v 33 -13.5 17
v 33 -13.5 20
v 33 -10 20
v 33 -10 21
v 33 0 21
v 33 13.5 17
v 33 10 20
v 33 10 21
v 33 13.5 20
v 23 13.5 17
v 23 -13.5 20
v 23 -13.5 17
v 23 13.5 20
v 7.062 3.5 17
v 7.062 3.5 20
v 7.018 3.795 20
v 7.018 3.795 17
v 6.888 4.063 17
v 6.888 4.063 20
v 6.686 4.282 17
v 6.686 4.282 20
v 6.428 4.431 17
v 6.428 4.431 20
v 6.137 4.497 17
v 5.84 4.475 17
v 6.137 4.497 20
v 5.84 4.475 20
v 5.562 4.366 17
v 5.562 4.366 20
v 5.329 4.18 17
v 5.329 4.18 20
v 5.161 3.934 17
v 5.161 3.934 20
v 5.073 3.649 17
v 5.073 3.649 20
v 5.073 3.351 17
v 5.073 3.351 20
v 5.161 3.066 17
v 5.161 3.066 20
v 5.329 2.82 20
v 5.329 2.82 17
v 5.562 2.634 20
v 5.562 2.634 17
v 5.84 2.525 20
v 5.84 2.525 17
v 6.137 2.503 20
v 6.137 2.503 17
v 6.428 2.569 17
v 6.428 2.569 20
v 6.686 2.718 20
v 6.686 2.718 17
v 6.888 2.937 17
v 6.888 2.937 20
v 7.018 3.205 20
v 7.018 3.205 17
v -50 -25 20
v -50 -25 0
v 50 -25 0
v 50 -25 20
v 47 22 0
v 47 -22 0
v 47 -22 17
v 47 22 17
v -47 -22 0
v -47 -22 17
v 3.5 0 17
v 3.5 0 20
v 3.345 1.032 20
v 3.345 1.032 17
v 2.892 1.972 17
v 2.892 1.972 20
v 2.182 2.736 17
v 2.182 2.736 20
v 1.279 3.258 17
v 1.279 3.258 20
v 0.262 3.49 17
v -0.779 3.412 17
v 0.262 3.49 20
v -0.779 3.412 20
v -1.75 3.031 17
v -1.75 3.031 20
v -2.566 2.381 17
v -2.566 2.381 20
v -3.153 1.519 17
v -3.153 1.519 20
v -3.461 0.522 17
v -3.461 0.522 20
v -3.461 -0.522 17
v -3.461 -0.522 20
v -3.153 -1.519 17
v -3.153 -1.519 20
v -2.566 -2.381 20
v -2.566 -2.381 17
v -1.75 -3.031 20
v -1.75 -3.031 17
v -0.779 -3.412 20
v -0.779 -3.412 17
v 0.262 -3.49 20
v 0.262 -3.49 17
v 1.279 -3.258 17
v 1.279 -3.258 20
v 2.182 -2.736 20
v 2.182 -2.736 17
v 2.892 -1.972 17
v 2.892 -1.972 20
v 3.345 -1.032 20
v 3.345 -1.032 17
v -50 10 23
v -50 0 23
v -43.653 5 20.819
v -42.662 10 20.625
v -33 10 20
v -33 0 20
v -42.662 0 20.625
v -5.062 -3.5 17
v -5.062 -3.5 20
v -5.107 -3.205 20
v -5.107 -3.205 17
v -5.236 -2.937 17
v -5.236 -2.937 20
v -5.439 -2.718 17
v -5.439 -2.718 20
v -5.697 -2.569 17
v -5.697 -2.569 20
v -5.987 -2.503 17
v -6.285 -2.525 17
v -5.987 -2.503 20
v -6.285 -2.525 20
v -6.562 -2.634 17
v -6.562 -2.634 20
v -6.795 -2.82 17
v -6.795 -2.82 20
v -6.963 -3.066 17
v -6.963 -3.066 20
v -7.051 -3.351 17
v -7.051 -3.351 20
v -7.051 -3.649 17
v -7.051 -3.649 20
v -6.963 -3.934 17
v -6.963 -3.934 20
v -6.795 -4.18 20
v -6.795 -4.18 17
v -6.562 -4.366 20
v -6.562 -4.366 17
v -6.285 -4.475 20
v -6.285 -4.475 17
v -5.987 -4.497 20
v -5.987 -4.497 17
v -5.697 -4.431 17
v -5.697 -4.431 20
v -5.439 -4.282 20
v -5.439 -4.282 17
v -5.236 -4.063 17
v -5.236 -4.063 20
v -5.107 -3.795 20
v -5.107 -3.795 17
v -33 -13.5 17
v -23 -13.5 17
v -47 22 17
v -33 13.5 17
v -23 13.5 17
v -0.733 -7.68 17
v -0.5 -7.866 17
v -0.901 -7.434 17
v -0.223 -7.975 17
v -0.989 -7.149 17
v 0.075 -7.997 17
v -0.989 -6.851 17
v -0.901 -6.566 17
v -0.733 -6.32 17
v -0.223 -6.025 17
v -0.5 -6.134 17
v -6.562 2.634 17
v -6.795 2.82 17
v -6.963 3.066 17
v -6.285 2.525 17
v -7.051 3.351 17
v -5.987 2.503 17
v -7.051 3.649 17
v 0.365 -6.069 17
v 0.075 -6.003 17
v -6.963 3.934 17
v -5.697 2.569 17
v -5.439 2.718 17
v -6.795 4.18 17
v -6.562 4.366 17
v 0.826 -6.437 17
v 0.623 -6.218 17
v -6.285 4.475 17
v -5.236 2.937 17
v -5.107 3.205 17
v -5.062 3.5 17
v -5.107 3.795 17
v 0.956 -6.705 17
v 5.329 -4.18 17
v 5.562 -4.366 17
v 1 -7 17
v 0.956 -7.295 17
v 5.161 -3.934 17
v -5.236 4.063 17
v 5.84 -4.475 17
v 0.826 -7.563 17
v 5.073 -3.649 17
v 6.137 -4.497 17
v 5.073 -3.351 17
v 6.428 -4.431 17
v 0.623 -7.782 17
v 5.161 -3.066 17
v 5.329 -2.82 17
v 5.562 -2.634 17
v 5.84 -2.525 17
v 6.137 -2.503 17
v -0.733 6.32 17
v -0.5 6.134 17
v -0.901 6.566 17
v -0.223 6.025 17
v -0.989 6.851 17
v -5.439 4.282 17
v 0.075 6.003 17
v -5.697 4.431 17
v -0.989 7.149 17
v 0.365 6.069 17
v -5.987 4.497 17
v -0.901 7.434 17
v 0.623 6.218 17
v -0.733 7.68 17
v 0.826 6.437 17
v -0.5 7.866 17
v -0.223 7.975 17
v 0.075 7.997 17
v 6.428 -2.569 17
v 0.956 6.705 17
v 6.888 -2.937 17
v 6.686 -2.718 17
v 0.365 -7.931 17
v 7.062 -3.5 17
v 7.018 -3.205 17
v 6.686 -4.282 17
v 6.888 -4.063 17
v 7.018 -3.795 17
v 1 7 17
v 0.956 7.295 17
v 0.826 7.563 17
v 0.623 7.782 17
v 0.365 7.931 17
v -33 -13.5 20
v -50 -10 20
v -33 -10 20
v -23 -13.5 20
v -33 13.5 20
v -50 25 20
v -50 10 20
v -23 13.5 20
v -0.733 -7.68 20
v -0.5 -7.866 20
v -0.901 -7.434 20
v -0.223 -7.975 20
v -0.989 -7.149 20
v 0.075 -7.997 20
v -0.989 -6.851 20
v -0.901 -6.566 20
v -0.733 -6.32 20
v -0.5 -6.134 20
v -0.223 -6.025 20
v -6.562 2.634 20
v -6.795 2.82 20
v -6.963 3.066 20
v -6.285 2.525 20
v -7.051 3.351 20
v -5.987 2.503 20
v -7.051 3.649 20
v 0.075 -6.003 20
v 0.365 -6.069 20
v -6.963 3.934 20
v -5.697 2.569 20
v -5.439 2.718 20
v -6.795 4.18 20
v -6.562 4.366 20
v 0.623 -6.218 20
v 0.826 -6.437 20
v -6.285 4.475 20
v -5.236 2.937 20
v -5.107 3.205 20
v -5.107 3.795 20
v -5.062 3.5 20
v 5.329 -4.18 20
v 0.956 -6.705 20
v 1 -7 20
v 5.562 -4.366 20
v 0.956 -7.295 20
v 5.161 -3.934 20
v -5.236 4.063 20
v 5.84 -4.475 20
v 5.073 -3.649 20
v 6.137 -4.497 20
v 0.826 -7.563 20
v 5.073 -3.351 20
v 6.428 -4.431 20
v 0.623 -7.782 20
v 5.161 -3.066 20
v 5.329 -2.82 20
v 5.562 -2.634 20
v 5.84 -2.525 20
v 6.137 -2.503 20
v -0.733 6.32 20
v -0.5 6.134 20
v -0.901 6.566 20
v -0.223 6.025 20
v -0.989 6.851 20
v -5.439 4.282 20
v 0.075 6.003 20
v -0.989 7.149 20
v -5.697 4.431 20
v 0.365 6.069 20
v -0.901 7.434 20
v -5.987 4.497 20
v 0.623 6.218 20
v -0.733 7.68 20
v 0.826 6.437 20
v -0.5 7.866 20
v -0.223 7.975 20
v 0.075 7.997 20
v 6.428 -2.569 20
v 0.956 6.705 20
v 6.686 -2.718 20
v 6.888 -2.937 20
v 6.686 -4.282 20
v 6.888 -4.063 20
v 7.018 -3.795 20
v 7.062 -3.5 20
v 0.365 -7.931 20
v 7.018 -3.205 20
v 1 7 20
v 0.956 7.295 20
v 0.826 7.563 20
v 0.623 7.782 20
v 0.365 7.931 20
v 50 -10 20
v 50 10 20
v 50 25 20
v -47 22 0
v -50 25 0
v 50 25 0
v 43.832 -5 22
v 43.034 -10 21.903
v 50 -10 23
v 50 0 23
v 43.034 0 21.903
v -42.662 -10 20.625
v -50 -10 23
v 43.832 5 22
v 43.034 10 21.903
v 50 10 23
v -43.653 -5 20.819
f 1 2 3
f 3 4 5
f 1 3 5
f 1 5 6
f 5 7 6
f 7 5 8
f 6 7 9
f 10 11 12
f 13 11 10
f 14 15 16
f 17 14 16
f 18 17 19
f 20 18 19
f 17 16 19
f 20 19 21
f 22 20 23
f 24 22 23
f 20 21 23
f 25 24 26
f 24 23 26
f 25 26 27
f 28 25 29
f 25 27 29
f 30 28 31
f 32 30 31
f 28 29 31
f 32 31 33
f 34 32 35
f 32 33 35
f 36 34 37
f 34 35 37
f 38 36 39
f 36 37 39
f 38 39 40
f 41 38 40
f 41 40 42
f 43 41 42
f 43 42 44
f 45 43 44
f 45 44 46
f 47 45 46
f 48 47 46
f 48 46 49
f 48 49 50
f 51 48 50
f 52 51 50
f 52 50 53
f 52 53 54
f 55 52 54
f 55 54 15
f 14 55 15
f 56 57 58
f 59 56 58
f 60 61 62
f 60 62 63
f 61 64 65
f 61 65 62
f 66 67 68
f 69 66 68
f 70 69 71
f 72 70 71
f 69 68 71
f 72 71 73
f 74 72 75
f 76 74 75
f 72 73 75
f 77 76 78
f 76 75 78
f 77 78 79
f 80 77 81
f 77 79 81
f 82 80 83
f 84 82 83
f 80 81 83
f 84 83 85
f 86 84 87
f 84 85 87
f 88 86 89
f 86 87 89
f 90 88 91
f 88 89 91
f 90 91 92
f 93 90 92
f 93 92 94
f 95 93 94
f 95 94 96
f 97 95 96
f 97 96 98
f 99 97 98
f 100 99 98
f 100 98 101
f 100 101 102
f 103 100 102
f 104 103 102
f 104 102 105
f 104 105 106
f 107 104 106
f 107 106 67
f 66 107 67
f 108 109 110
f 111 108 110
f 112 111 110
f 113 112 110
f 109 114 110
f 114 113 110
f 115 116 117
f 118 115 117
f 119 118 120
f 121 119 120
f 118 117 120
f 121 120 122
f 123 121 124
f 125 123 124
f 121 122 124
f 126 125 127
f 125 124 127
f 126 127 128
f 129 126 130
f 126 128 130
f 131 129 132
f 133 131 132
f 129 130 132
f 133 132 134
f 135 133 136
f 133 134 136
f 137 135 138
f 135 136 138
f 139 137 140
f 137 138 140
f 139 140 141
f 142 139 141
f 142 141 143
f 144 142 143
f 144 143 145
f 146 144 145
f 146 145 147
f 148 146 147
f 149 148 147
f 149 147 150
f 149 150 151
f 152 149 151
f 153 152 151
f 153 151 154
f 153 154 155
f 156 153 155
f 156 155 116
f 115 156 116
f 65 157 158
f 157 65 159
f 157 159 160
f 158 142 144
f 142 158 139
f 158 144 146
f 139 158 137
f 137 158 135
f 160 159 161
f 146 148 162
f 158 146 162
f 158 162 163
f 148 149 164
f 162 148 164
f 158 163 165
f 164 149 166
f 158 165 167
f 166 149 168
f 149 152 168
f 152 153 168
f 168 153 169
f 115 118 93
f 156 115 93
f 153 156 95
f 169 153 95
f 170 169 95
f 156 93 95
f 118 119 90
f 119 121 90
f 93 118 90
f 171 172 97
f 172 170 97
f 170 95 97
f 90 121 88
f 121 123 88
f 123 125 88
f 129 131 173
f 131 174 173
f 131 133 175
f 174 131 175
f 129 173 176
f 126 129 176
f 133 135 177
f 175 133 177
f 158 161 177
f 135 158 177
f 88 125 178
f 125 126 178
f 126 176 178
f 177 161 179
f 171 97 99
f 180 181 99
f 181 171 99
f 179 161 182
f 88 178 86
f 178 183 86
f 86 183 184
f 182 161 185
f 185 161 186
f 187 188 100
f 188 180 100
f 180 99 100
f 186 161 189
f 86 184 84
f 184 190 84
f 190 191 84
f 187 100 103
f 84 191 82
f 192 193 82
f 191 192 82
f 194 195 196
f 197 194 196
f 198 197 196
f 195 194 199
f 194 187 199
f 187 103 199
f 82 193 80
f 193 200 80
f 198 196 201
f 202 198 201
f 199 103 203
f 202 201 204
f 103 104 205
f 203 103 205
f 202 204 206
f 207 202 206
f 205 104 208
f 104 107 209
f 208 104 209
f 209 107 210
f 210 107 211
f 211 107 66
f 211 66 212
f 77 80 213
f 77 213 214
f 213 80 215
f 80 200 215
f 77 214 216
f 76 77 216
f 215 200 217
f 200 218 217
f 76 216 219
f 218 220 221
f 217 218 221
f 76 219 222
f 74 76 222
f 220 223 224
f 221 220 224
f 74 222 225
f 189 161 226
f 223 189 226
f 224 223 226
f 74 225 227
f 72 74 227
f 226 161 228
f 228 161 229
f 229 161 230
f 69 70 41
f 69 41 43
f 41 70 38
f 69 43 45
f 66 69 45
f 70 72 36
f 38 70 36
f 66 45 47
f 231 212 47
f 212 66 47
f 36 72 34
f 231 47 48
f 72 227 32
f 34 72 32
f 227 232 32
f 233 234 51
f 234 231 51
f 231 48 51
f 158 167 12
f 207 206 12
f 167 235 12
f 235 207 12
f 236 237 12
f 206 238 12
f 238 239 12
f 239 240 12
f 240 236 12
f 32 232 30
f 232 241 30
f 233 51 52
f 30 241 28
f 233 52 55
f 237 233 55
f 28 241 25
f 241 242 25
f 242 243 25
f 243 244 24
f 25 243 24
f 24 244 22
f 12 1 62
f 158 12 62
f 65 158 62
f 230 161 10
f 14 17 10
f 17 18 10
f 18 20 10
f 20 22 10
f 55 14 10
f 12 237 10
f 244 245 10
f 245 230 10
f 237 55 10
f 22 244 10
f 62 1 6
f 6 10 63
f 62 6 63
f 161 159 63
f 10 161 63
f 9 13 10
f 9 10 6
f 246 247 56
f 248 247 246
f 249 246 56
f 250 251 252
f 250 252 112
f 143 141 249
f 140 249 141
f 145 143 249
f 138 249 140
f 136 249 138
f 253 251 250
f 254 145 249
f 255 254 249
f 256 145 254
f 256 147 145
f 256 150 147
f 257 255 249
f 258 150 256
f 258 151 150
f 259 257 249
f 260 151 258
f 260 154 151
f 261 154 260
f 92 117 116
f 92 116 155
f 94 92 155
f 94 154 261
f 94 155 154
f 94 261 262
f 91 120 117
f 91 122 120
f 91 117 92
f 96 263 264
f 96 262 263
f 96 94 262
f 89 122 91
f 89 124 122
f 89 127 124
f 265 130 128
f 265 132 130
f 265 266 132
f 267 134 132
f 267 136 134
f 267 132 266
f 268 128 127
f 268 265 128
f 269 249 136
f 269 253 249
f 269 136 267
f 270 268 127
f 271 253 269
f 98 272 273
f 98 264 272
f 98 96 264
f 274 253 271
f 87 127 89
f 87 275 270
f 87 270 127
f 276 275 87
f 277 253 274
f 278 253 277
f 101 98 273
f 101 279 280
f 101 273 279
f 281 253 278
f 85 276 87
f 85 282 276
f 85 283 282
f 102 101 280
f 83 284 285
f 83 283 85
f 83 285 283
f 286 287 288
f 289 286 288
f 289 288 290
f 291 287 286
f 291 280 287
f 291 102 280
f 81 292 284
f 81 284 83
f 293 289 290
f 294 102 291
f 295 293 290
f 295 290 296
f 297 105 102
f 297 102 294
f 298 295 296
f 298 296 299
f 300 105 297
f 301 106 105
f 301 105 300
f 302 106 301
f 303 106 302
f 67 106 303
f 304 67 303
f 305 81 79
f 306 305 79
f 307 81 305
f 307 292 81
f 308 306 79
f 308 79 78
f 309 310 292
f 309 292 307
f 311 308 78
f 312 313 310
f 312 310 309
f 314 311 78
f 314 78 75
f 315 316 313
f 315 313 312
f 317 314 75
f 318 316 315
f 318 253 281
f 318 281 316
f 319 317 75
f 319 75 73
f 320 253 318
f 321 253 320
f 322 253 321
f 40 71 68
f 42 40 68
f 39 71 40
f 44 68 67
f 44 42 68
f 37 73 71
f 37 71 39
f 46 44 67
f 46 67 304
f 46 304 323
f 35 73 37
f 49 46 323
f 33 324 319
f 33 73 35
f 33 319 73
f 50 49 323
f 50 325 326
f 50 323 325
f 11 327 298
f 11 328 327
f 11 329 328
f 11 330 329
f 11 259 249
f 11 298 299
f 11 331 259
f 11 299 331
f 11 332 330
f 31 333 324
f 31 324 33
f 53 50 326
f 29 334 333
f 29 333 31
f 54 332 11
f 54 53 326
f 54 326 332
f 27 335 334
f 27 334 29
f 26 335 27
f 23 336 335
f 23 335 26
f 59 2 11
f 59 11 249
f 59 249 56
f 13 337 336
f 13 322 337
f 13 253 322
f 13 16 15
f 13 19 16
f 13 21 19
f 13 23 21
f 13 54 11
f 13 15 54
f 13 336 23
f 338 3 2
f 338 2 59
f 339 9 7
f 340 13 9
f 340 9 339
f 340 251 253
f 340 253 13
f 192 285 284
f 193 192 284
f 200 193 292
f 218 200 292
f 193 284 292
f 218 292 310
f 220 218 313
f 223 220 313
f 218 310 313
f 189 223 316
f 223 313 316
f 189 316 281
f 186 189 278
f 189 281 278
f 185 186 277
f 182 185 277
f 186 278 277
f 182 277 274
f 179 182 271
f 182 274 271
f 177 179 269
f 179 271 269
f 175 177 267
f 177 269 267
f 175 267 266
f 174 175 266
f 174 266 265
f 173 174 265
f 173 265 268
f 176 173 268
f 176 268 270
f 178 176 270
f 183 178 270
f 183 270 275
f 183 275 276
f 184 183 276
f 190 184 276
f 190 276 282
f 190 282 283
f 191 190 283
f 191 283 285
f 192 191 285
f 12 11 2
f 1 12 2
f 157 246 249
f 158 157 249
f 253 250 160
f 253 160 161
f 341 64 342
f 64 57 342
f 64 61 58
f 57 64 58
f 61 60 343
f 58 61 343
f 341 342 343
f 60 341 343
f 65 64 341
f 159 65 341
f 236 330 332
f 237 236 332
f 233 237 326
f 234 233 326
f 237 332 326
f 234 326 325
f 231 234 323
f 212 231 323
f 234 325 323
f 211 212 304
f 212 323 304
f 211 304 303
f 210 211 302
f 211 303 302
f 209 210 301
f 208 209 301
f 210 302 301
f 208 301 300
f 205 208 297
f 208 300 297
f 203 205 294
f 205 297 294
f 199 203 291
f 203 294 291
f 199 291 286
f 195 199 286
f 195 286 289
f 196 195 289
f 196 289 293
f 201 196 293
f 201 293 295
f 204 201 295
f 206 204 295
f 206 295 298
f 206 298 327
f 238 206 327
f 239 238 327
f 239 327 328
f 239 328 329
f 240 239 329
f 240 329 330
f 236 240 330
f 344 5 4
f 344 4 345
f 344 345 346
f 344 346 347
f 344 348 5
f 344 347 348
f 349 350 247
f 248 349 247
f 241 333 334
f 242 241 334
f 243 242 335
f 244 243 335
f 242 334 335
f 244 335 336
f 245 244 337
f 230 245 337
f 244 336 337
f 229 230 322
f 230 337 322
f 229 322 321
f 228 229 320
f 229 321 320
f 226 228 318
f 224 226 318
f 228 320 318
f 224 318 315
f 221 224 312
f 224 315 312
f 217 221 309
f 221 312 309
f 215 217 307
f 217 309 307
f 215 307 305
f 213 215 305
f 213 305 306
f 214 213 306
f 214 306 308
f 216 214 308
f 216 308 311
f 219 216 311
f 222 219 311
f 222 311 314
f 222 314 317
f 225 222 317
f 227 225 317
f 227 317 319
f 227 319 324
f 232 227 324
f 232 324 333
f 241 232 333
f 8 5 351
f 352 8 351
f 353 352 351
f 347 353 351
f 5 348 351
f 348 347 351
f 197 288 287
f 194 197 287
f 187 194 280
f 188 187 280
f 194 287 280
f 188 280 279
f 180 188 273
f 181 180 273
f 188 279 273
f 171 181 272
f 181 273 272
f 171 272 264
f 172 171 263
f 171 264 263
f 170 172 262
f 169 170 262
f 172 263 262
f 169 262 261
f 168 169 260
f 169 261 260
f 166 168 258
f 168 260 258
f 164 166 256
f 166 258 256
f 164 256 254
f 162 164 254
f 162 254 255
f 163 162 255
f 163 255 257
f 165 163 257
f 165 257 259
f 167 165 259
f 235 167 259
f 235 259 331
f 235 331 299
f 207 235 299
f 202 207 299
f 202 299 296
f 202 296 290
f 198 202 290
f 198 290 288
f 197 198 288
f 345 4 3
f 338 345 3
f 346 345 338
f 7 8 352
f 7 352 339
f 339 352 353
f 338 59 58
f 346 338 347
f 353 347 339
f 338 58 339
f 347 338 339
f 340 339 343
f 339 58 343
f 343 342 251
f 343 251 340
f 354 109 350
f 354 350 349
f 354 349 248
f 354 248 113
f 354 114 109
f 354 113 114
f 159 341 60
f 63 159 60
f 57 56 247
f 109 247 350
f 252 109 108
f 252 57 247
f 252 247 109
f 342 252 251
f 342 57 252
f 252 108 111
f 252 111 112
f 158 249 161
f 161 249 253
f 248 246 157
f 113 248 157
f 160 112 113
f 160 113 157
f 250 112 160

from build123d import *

# Parameters (mm, degrees)
F0_W     = 100
F0_H     = 50
F1_DEPTH = 20
F2_T     = -3
F3_R     = 3.5
F3_R_2   = 1
F3_W     = 10
F3_H     = 27
F4_DEPTH = 25
F6_DEPTH = 10


with BuildPart() as f1:
    # F0 (on Top) → F1 (new body)
    with BuildSketch(Plane.XY):
        Rectangle(F0_W, F0_H)
    extrude(amount=F1_DEPTH)

    # F2
    f2_openings = [f1.faces().sort_by_distance(p)[0] for p in [
        (0, 0, 0),
    ]]
    offset(amount=F2_T, openings=f2_openings)

    # F3 (on face) → F4 (cut)
    with BuildSketch(Plane.XY.offset(20)):
        Circle(F3_R)
        with Locations((0, 7)):
            Circle(F3_R_2)
        with Locations((-6.0621778265, 3.5)):
            Circle(F3_R_2)
        with Locations((-6.0621778265, -3.5)):
            Circle(F3_R_2)
        with Locations((0, -7)):
            Circle(F3_R_2)
        with Locations((6.0621778265, -3.5)):
            Circle(F3_R_2)
        with Locations((6.0621778265, 3.5)):
            Circle(F3_R_2)
        with Locations((-28, 0)):
            Rectangle(F3_W, F3_H)
        with Locations((28, 0)):
            Rectangle(F3_W, F3_H)
    extrude(amount=-F4_DEPTH, mode=Mode.SUBTRACT)

    # F5 (on Front) → F6 (join, symmetric)
    with BuildSketch(Plane.XZ):
        with BuildLine():
            Line((33, 20), (50, 20))
            Line((50, 20), (50, 23))
            add(Edge.make_bspline(
                [(33, 21), (36.8661454102, 21.3032203159), (43.6623686797, 21.8362455253), (48.0907692486, 22.6494154176), (50, 23)],
                knots=[0, 0, 0, 0, 0.5688667451, 1, 1, 1, 1], degree=3))
            Line((33, 21), (33, 20))
        make_face()
        with BuildLine():
            Line((-50, 23), (-50, 20))
            Line((-50, 20), (-33, 20))
            add(Edge.make_bspline(
                [(-50, 23), (-47.7477722772, 22.3250847317), (-43.9802378635, 20.1526522743), (-36.3079621025, 20.101446954), (-33, 20)],
                knots=[0, 0, 0, 0, 0.4421409573, 1, 1, 1, 1], degree=3))
        make_face()
    extrude(amount=F6_DEPTH, both=True)


solid = f1.part
